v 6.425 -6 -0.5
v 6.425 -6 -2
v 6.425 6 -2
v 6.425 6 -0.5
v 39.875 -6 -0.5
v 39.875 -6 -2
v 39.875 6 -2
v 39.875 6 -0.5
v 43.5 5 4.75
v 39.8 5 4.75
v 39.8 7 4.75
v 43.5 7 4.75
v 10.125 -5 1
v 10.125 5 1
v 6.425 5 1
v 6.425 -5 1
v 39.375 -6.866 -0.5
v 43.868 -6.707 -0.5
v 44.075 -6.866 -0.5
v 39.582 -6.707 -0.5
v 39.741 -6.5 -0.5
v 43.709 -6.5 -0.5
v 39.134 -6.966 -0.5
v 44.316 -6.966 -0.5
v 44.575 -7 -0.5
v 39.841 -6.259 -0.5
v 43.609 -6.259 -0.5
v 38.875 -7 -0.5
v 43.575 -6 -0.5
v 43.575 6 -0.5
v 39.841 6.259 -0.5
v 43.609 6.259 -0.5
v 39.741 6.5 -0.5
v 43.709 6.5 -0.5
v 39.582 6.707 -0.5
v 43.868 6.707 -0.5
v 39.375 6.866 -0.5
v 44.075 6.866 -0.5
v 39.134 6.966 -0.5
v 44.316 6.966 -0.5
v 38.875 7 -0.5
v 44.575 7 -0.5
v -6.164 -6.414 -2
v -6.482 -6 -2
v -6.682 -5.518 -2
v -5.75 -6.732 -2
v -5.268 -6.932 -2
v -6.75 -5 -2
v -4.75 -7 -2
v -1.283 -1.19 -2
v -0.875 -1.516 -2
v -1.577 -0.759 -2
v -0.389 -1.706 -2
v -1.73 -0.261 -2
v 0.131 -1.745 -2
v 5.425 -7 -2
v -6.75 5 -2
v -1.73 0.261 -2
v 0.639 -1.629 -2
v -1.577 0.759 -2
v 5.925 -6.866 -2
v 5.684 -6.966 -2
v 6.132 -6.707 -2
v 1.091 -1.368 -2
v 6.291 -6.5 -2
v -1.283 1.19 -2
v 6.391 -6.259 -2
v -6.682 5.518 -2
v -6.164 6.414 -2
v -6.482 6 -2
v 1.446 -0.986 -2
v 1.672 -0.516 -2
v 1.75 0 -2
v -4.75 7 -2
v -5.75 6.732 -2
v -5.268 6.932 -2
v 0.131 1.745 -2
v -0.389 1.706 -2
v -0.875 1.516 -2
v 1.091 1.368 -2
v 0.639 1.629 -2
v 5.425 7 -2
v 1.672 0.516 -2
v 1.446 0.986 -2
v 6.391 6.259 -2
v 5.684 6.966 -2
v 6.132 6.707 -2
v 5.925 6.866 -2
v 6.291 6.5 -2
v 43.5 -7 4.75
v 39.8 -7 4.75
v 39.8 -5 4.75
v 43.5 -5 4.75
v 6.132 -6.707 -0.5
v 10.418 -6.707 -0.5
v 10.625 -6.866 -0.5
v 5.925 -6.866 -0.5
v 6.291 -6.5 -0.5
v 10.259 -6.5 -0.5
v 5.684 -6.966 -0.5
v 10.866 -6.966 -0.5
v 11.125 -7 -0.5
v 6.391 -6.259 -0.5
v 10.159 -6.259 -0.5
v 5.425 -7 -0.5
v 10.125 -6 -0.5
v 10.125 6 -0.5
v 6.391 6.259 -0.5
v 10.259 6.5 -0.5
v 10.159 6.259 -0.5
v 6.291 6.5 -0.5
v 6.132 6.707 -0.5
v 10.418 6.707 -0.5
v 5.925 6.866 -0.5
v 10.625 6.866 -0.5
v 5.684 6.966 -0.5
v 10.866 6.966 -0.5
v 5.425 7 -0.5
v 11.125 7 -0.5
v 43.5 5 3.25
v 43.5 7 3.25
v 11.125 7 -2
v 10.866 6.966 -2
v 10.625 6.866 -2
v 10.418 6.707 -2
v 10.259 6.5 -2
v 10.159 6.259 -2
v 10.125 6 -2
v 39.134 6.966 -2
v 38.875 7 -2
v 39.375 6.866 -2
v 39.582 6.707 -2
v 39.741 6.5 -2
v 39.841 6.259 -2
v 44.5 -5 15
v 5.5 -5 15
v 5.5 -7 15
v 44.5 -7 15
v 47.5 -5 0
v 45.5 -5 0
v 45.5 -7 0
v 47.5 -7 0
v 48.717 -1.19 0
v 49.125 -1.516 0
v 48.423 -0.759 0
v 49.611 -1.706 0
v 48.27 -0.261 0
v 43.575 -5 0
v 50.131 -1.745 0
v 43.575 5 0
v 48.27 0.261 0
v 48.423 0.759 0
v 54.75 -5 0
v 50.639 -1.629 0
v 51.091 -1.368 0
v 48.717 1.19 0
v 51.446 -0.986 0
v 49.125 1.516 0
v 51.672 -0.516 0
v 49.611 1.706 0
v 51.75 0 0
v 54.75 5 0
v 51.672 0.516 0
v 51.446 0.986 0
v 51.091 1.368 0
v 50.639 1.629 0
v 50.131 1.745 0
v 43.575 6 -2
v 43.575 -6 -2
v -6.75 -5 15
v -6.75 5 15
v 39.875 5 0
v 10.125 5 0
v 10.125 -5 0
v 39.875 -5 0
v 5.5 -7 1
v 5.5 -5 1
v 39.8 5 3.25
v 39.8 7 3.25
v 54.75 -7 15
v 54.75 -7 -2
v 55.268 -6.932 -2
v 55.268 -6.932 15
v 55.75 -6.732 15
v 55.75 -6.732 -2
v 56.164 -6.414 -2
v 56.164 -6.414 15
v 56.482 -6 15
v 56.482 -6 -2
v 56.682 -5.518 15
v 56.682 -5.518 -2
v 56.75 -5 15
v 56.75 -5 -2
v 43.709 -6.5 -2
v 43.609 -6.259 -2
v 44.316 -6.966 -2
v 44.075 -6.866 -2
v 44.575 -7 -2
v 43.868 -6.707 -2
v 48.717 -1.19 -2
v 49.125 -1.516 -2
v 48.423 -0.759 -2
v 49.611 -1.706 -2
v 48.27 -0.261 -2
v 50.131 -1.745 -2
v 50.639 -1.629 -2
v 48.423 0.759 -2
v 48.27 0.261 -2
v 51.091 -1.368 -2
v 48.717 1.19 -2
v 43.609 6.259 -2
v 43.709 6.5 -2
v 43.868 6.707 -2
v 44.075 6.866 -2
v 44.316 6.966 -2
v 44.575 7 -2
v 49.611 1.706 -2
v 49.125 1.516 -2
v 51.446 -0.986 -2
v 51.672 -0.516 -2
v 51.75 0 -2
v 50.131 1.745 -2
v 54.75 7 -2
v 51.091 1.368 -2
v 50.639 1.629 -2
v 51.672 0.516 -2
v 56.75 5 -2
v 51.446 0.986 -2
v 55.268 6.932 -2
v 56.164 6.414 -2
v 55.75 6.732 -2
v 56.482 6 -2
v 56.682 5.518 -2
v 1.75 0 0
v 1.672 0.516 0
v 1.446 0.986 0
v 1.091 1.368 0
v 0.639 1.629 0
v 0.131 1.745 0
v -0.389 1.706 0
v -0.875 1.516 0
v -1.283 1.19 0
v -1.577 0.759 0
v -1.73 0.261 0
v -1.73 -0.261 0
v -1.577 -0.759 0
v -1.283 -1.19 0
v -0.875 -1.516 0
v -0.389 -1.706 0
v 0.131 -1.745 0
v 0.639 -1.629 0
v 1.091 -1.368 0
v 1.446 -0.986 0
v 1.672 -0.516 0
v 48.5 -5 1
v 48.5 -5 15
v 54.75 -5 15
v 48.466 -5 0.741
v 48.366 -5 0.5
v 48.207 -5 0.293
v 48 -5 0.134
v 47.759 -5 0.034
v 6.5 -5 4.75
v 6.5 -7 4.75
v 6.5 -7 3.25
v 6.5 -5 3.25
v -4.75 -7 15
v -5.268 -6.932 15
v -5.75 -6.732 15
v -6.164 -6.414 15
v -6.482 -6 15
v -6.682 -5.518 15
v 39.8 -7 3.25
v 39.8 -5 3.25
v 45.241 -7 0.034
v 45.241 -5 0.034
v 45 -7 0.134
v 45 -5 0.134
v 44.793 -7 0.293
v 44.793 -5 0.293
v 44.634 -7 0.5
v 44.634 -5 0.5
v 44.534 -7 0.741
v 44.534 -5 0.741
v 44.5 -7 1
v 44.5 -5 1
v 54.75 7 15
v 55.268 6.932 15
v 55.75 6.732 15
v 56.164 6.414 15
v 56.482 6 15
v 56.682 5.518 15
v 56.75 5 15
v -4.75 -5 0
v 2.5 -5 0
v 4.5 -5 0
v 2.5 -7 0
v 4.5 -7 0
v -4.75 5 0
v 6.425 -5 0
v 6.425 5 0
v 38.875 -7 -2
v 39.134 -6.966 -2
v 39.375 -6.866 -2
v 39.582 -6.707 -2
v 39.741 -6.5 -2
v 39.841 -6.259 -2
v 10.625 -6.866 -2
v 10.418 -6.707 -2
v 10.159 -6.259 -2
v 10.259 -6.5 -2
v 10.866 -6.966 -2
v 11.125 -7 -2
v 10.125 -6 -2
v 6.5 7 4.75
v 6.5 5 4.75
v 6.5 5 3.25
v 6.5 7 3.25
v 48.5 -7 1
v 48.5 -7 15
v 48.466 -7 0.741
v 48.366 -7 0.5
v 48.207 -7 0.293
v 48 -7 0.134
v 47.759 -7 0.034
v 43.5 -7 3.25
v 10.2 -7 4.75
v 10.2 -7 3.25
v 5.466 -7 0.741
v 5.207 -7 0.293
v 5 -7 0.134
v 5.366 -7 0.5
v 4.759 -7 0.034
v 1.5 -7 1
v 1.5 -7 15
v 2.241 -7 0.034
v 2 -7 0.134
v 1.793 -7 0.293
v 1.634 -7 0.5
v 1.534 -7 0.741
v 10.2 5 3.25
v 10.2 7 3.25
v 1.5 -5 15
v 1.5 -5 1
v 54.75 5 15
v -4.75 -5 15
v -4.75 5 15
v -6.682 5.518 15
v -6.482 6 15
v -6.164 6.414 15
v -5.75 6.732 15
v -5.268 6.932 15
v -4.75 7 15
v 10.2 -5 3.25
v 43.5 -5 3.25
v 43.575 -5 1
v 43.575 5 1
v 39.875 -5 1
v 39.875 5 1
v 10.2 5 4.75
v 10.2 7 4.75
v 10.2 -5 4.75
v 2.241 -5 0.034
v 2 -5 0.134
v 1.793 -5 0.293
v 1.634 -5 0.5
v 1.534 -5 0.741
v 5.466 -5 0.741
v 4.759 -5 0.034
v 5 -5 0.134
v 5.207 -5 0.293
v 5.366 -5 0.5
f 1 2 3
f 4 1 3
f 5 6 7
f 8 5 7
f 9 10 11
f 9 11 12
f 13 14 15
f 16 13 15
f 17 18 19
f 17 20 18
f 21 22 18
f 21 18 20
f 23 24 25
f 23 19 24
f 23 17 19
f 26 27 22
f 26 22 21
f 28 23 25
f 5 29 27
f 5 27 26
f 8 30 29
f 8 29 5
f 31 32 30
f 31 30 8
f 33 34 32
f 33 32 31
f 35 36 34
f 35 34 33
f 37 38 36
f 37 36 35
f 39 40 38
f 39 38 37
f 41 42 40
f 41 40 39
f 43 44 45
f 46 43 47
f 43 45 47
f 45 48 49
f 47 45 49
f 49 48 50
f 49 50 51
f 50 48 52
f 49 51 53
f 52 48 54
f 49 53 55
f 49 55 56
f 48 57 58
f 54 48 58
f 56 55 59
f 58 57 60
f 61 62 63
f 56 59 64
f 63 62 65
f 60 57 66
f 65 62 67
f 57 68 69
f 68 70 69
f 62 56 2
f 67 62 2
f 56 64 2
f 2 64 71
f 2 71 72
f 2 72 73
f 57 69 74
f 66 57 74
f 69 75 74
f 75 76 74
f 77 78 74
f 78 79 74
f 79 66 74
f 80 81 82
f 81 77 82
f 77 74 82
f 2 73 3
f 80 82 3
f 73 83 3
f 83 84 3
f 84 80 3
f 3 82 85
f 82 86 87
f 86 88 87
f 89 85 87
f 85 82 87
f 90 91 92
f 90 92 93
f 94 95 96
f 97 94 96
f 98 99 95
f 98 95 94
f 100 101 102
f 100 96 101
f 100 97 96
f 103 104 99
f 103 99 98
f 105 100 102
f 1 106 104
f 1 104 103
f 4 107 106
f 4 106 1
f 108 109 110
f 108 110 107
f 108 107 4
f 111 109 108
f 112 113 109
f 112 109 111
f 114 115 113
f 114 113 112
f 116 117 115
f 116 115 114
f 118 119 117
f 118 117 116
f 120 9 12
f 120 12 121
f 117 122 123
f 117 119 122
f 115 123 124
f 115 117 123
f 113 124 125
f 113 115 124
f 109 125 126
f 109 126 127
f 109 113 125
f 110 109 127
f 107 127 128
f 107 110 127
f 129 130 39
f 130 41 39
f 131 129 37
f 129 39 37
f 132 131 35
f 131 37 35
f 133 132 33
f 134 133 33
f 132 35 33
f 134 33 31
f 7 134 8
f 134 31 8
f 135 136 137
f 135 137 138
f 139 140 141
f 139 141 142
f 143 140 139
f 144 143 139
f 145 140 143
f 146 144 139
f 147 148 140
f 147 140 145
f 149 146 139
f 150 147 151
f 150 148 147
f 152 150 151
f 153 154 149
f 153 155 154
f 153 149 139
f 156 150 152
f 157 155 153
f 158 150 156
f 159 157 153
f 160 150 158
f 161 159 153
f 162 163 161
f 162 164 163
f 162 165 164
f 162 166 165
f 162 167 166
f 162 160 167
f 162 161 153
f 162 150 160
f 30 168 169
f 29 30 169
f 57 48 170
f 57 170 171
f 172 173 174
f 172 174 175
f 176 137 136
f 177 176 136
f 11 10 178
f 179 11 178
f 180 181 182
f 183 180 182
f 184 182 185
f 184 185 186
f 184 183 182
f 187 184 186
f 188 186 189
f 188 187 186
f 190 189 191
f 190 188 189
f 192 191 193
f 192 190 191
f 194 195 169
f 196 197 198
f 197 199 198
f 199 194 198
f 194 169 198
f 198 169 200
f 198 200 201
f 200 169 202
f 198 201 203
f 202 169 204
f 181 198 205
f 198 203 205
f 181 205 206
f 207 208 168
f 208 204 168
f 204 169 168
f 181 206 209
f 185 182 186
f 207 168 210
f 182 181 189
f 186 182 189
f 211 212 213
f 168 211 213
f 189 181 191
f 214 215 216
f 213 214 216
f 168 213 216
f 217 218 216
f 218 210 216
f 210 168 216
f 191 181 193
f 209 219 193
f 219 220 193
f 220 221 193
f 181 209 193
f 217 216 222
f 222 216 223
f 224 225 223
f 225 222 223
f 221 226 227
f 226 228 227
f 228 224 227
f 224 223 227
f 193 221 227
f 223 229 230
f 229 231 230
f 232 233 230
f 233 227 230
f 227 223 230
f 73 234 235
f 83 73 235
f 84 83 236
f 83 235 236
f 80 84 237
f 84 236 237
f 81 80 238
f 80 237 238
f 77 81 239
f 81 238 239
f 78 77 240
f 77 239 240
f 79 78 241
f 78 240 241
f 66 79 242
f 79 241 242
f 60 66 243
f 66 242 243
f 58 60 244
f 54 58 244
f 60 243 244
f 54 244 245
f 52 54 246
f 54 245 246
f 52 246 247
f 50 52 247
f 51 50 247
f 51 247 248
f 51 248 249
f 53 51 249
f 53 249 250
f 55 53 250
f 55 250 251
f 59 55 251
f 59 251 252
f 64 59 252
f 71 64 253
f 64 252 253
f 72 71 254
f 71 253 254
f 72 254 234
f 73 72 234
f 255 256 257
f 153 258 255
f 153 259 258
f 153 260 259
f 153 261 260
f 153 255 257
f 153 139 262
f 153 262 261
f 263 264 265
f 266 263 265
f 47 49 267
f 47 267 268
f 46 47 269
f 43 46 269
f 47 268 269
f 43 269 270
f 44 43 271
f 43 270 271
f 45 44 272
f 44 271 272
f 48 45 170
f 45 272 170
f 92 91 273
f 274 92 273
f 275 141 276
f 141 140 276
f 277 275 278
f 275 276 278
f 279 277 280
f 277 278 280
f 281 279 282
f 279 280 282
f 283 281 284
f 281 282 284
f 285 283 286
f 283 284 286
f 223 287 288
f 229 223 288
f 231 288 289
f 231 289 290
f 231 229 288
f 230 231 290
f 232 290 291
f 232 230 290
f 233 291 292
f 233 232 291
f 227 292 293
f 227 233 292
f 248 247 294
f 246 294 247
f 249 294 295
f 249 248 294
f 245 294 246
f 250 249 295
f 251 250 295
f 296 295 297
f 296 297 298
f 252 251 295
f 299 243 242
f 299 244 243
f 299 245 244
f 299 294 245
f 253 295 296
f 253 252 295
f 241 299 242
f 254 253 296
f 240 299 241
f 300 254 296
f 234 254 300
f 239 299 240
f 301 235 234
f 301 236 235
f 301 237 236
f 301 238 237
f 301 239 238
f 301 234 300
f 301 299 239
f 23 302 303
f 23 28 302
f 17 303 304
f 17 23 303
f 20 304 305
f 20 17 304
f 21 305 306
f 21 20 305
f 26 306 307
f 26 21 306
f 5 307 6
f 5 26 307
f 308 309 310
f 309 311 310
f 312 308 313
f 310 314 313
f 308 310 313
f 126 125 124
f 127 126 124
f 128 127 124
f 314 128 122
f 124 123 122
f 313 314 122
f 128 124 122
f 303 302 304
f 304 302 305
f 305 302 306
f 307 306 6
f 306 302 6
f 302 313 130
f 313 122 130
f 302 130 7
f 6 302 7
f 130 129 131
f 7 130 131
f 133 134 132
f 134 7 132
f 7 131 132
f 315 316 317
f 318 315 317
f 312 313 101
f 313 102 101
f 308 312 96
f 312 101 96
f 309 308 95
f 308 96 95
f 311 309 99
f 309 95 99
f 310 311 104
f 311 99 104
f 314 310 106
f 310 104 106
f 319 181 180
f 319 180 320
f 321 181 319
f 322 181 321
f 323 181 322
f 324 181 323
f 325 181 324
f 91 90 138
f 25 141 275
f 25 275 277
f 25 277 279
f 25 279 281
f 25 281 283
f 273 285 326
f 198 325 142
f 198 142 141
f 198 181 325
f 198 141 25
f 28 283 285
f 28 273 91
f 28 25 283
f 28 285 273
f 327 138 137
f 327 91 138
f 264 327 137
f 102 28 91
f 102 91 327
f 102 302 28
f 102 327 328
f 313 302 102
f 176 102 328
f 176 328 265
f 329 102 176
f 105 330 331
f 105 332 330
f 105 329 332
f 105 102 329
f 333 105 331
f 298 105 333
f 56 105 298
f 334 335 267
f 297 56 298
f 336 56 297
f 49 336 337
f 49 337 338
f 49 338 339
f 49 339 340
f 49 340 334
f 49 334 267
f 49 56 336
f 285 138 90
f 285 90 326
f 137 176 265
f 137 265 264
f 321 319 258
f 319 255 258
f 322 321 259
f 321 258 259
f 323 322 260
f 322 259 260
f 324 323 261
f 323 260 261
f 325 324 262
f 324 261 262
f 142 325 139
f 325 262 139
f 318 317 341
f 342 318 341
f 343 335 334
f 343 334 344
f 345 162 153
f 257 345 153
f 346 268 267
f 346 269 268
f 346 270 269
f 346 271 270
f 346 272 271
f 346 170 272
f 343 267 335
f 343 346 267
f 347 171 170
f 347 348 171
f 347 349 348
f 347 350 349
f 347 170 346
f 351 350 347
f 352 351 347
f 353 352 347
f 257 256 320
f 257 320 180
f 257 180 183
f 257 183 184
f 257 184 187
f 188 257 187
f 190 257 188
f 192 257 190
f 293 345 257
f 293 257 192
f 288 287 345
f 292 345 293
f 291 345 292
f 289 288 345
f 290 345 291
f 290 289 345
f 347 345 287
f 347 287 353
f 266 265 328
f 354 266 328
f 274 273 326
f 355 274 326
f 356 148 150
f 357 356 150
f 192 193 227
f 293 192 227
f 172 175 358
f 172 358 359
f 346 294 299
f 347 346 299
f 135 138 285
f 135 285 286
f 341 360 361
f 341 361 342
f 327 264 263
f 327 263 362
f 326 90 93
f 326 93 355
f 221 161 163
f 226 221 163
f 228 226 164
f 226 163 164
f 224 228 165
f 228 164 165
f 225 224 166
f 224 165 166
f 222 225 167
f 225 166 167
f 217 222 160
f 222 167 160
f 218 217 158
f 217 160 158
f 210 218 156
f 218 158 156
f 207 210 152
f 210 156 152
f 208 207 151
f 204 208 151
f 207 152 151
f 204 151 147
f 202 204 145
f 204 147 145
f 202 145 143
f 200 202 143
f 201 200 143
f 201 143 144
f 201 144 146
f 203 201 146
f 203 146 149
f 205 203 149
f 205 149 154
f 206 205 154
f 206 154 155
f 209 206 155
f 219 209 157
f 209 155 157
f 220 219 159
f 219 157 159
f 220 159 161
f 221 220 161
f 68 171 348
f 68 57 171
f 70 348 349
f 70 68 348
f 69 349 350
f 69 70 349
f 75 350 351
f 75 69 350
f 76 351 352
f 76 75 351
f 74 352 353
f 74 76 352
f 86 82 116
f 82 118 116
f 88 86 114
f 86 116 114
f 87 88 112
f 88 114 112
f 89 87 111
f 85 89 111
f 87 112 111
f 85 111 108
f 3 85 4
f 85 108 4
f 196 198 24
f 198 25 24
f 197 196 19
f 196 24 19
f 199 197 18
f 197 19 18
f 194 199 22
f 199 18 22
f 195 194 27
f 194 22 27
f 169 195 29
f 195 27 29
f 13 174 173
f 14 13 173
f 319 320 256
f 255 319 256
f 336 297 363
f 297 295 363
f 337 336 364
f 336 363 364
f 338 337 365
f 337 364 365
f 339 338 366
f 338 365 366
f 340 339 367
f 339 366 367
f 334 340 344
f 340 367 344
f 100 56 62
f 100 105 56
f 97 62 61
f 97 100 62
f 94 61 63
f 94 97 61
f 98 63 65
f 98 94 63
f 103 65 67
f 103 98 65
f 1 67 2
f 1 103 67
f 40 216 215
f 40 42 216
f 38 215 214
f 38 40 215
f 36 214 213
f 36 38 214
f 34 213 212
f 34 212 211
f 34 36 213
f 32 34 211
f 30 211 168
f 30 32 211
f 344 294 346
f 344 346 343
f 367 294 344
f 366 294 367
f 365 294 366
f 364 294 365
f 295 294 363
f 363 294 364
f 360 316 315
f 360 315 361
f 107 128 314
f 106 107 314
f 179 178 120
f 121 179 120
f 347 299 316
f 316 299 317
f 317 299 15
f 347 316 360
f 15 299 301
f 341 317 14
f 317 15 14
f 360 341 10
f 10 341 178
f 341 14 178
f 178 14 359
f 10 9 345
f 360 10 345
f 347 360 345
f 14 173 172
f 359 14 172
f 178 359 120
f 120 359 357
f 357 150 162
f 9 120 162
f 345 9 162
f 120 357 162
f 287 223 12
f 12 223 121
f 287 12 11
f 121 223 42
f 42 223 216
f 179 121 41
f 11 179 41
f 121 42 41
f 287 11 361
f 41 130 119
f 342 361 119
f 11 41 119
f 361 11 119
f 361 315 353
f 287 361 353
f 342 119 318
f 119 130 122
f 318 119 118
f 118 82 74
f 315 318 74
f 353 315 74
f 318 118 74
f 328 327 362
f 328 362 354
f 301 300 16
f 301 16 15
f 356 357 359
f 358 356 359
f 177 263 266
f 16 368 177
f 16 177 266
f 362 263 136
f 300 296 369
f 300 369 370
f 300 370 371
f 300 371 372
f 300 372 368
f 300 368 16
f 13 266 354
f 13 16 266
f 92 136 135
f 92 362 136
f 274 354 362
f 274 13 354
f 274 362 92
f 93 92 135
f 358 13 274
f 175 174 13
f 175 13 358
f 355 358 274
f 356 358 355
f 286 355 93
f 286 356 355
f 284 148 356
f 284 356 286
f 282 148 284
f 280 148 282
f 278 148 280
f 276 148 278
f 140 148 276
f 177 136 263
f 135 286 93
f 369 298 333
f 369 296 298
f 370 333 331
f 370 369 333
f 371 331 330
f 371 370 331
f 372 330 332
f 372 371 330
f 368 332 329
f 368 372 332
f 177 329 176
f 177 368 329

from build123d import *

# Parameters (mm, degrees)
SKETCH1_W              = 2
SKETCH1_H              = 2
SKETCH1_H_2            = 10
SKETCH1_W_2            = 59.5
BOSS_EXTRUDE1_DEPTH    = 15
SKETCH1_5_W            = 59.5
SKETCH1_5_H            = 10
SKETCH1_5_R            = 1.75
SKETCH1_5_H_2          = 2
SKETCH1_5_W_2          = 2
BOSS_EXTRUDE2_DEPTH    = 2
SKETCH2_W              = 4
SKETCH2_H              = 2
CUT_EXTRUDE1_DEPTH     = 15
CUT_EXTRUDE2_START     = -14
CUT_EXTRUDE2_OUTLINE_W = 3.7
CUT_EXTRUDE2_OUTLINE_H = 1.5
CUT_EXTRUDE2_DEPTH     = 14
CUT_EXTRUDE3_DEPTH     = 1.5
FILLET1_R              = 2
FILLET2_R              = 1
SKETCH11_W             = 3.7
SKETCH11_H             = 14
BOSS_EXTRUDE4_DEPTH    = 1.5


# Read off the part's stored shape, not the designer's step: Cut-Extrude2
with BuildPart() as part:
    # Sketch1 → Boss-Extrude1 (new body)
    with BuildSketch(Plane.XY):
        with Locations((55.75, 6)):
            Rectangle(SKETCH1_W, SKETCH1_H)
        with Locations((55.75, 0)):
            Rectangle(SKETCH1_W, SKETCH1_H_2)
        with Locations((-5.75, 0)):
            Rectangle(SKETCH1_W, SKETCH1_H_2)
        with Locations((-5.75, 6)):
            Rectangle(SKETCH1_W, SKETCH1_H)
        with Locations((25, 6)):
            Rectangle(SKETCH1_W_2, SKETCH1_H)
        with Locations((-5.75, -6)):
            Rectangle(SKETCH1_W, SKETCH1_H)
        with Locations((25, -6)):
            Rectangle(SKETCH1_W_2, SKETCH1_H)
        with Locations((55.75, -6)):
            Rectangle(SKETCH1_W, SKETCH1_H)
    extrude(amount=BOSS_EXTRUDE1_DEPTH)

    # Sketch1<5> → Boss-Extrude2 (add)
    # profile 1 of 9: a face of its own
    with BuildSketch(Plane.XY):
        with Locations((25, 0)):
            Rectangle(SKETCH1_5_W, SKETCH1_5_H)
        Circle(SKETCH1_5_R, mode=Mode.SUBTRACT)
        with Locations((50, 0)):
            Circle(SKETCH1_5_R, mode=Mode.SUBTRACT)
    # profile 2 of 9: a face of its own
    with BuildSketch(Plane.XY):
        with Locations((25, 6)):
            Rectangle(SKETCH1_5_W, SKETCH1_5_H_2)
    # profile 3 of 9: a face of its own
    with BuildSketch(Plane.XY):
        with Locations((25, -6)):
            Rectangle(SKETCH1_5_W, SKETCH1_5_H_2)
    # profile 4 of 9: a face of its own
    with BuildSketch(Plane.XY):
        with Locations((55.75, 0)):
            Rectangle(SKETCH1_5_W_2, SKETCH1_5_H)
    # profile 5 of 9: a face of its own
    with BuildSketch(Plane.XY):
        with Locations((55.75, 6)):
            Rectangle(SKETCH1_5_W_2, SKETCH1_5_H_2)
    # profile 6 of 9: a face of its own
    with BuildSketch(Plane.XY):
        with Locations((55.75, -6)):
            Rectangle(SKETCH1_5_W_2, SKETCH1_5_H_2)
    # profile 7 of 9: a face of its own
    with BuildSketch(Plane.XY):
        with Locations((-5.75, 6)):
            Rectangle(SKETCH1_5_W_2, SKETCH1_5_H_2)
    # profile 8 of 9: a face of its own
    with BuildSketch(Plane.XY):
        with Locations((-5.75, 0)):
            Rectangle(SKETCH1_5_W_2, SKETCH1_5_H)
    # profile 9 of 9: a face of its own
    with BuildSketch(Plane.XY):
        with Locations((-5.75, -6)):
            Rectangle(SKETCH1_5_W_2, SKETCH1_5_H_2)
    extrude(amount=-BOSS_EXTRUDE2_DEPTH)

    # Sketch2 → Cut-Extrude1 (cut)
    with BuildSketch(Plane.XY.offset(15)):
        with Locations((3.5, -6)):
            Rectangle(SKETCH2_W, SKETCH2_H)
        with Locations((46.5, -6)):
            Rectangle(SKETCH2_W, SKETCH2_H)
    extrude(amount=-CUT_EXTRUDE1_DEPTH, mode=Mode.SUBTRACT)

    # Cut-Extrude2 outline → Cut-Extrude2 (cut)
    with BuildSketch(Plane(origin=(0, 7, 0), x_dir=(1, 0, 0), z_dir=(0, 1, 0)).offset(CUT_EXTRUDE2_START)):
        with Locations((8.35, -4)):
            Rectangle(CUT_EXTRUDE2_OUTLINE_W, CUT_EXTRUDE2_OUTLINE_H)
        with Locations((41.65, -4)):
            Rectangle(CUT_EXTRUDE2_OUTLINE_W, CUT_EXTRUDE2_OUTLINE_H)
    extrude(amount=CUT_EXTRUDE2_DEPTH, mode=Mode.SUBTRACT)

    # Sketch4 → Cut-Extrude3 (cut)
    with BuildSketch(Plane(origin=(0, 0, -2), x_dir=(-1, 0, 0), z_dir=(0, 0, -1))):
        Polygon((-10.125, 7), (-10.125, 5), (-10.125, -5), (-10.125, -7), (-6.425, -7), (-6.425, 7), align=None)
        Polygon((-39.875, 5), (-39.875, 7), (-43.575, 7), (-43.575, -7), (-39.875, -7), (-39.875, -5), align=None)
    extrude(amount=-CUT_EXTRUDE3_DEPTH, mode=Mode.SUBTRACT)

    # Fillet1
    fillet1_edges = [part.edges().sort_by_distance(p)[0] for p in [
        (-6.75, 7, 6.5),
        (56.75, 7, 6.5),
        (56.75, -7, 6.5),
        (-6.75, -7, 6.5),
    ]]
    fillet(fillet1_edges, radius=FILLET1_R)

    # Fillet2
    fillet2_edges = [part.edges().sort_by_distance(p)[0] for p in [
        (10.125, -7, -1.25),
        (10.125, 7, -1.25),
        (6.425, 7, -1.25),
        (6.425, -7, -1.25),
        (39.875, 7, -1.25),
        (39.875, -7, -1.25),
        (43.575, -7, -1.25),
        (43.575, 7, -1.25),
        (1.5, -6, 0),
        (5.5, -6, 0),
        (48.5, -6, 0),
        (44.5, -6, 0),
    ]]
    fillet(fillet2_edges, radius=FILLET2_R)

    # Sketch11 → Boss-Extrude4 (add)
    with BuildSketch(Plane(origin=(0, 0, -0.5), x_dir=(-1, 0, 0), z_dir=(0, 0, -1))):
        with Locations((-41.725, 0)):
            Rectangle(SKETCH11_W, SKETCH11_H)
        with Locations((-8.275, 0)):
            Rectangle(SKETCH11_W, SKETCH11_H)
    extrude(amount=-BOSS_EXTRUDE4_DEPTH)


solid = part.part
